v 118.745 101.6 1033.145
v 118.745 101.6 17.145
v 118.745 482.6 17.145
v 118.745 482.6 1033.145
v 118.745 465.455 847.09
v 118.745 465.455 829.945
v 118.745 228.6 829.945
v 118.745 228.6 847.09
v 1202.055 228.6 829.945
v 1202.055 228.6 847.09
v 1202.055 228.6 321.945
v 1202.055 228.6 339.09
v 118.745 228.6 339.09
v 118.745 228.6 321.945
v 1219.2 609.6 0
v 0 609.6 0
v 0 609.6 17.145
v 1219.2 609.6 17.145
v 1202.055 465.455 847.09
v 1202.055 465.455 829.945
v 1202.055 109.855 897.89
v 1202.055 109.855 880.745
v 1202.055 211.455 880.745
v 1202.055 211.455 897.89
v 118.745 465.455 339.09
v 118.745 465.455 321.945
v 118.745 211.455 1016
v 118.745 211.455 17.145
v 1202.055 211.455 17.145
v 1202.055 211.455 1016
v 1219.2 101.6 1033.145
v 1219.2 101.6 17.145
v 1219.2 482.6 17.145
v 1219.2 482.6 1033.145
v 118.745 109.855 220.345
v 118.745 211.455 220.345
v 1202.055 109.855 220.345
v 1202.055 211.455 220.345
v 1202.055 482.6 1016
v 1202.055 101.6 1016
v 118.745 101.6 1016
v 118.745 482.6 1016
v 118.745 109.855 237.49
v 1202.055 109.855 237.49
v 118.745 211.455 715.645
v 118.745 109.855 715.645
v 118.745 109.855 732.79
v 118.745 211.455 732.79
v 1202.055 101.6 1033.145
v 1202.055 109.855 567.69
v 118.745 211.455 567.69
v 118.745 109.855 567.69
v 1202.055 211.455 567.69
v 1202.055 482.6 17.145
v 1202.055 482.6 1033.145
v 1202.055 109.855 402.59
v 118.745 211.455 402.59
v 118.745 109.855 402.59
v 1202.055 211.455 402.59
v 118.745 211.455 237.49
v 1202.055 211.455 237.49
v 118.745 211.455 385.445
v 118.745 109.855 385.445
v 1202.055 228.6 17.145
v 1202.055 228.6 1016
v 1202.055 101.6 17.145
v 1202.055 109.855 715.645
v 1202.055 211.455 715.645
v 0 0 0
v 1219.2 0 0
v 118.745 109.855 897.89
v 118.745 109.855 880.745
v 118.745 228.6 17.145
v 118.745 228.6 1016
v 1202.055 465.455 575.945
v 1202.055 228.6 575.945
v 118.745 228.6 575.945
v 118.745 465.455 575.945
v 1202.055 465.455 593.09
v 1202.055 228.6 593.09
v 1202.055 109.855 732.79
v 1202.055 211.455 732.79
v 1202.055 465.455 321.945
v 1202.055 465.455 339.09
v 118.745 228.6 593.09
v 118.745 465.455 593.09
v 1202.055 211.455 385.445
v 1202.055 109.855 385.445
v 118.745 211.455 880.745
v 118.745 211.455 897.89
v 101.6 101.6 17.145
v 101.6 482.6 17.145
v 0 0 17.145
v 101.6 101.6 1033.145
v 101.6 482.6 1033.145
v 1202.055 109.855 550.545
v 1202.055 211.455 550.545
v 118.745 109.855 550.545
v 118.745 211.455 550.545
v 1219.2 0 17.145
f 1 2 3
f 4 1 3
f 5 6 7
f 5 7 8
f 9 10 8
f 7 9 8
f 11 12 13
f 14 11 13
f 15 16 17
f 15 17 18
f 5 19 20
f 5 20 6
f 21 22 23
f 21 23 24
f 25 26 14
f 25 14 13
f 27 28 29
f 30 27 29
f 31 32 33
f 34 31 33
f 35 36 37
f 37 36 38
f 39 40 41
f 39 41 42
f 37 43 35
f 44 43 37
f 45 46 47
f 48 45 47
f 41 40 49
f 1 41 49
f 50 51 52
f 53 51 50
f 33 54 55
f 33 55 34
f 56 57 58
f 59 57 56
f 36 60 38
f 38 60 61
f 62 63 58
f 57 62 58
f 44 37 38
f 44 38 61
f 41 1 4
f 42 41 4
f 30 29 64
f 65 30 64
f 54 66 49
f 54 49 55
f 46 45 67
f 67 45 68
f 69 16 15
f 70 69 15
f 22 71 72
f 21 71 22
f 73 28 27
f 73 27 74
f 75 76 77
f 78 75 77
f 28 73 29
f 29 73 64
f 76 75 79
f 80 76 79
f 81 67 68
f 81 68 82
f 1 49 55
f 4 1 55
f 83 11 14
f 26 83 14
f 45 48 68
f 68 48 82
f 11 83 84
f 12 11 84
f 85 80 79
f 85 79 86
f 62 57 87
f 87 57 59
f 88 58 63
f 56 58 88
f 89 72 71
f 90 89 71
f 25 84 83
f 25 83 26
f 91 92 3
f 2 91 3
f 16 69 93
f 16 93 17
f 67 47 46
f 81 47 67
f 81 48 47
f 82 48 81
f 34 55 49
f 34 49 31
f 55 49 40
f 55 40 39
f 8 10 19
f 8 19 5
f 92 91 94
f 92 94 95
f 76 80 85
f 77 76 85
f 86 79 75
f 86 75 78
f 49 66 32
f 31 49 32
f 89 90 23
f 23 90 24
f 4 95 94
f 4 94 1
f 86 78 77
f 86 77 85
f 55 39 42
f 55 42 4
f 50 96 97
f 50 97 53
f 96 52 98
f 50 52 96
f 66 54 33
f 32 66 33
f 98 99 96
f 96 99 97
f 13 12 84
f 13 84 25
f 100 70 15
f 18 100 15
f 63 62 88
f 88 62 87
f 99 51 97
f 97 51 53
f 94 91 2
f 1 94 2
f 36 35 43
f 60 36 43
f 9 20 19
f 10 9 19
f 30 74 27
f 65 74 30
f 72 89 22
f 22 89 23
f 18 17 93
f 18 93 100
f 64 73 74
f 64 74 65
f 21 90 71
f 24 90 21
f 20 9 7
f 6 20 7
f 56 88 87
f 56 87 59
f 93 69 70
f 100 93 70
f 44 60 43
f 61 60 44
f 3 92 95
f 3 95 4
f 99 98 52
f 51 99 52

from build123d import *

# Parameters (mm, degrees)
F0_W      = 1219.2
F0_H      = 609.6
F1_DEPTH  = 17.145
F2_W      = 17.145
F2_H      = 381
F3_DEPTH  = 1016
F4_W      = 1083.31
F4_H      = 17.145
F5_DEPTH  = 998.855
F6_W      = 17.145
F6_H      = 381
F7_DEPTH  = 1016
F8_W      = 1083.31
F8_H      = 17.145
F9_DEPTH  = 236.855
F10_W     = 1083.31
F10_H     = 17.145
F11_DEPTH = 101.6
F12_W     = 381
F12_H     = 17.145
F13_DEPTH = 1083.31


with BuildPart() as f1:
    # F0 (on Top) → F1 (new body)
    with BuildSketch(Plane.XY):
        with Locations((609.6, 304.8)):
            Rectangle(F0_W, F0_H)
    extrude(amount=F1_DEPTH)


with BuildPart() as f3:
    # F2 (on face) → F3 (new body)
    with BuildSketch(Plane.XY.offset(17.145)):
        with Locations((110.1725, 292.1)):
            Rectangle(F2_W, F2_H)
    extrude(amount=F3_DEPTH)


with BuildPart() as f5:
    # F4 (on face) → F5 (new body)
    with BuildSketch(Plane.XY.offset(17.145)):
        with Locations((660.4, 220.0275)):
            Rectangle(F4_W, F4_H)
    extrude(amount=F5_DEPTH)


with BuildPart() as f7:
    # F6 (on face) → F7 (new body)
    with BuildSketch(Plane.XY.offset(17.145)):
        with Locations((1210.6275, 292.1)):
            Rectangle(F6_W, F6_H)
    extrude(amount=F7_DEPTH)


with BuildPart() as f9:
    # F8 (on face) → F9 (new body)
    with BuildSketch(Plane(origin=(0, 228.6, 0), x_dir=(-1, 0, 0), z_dir=(0, 1, 0))):
        with Locations((-660.4, 330.5175)):
            Rectangle(F8_W, F8_H)
        with Locations((-660.4, 584.5175)):
            Rectangle(F8_W, F8_H)
        with Locations((-660.4, 838.5175)):
            Rectangle(F8_W, F8_H)
    extrude(amount=F9_DEPTH)


with BuildPart() as f11:
    # F10 (on face) → F11 (new body)
    with BuildSketch(Plane.XZ.offset(-211.455)):
        with Locations((660.4, 889.3175)):
            Rectangle(F10_W, F10_H)
        with Locations((660.4, 724.2175)):
            Rectangle(F10_W, F10_H)
        with Locations((660.4, 559.1175)):
            Rectangle(F10_W, F10_H)
        with Locations((660.4, 394.0175)):
            Rectangle(F10_W, F10_H)
        with Locations((660.4, 228.9175)):
            Rectangle(F10_W, F10_H)
    extrude(amount=F11_DEPTH)


with BuildPart() as f13:
    # F12 (on face) → F13 (new body, through all)
    with BuildSketch(Plane.YZ.offset(118.745)):
        with Locations((292.1, 1024.5725)):
            Rectangle(F12_W, F12_H)
    extrude(amount=F13_DEPTH)


solid = Compound([f1.part, f3.part, f5.part, f7.part, f9.part, f11.part, f13.part])
